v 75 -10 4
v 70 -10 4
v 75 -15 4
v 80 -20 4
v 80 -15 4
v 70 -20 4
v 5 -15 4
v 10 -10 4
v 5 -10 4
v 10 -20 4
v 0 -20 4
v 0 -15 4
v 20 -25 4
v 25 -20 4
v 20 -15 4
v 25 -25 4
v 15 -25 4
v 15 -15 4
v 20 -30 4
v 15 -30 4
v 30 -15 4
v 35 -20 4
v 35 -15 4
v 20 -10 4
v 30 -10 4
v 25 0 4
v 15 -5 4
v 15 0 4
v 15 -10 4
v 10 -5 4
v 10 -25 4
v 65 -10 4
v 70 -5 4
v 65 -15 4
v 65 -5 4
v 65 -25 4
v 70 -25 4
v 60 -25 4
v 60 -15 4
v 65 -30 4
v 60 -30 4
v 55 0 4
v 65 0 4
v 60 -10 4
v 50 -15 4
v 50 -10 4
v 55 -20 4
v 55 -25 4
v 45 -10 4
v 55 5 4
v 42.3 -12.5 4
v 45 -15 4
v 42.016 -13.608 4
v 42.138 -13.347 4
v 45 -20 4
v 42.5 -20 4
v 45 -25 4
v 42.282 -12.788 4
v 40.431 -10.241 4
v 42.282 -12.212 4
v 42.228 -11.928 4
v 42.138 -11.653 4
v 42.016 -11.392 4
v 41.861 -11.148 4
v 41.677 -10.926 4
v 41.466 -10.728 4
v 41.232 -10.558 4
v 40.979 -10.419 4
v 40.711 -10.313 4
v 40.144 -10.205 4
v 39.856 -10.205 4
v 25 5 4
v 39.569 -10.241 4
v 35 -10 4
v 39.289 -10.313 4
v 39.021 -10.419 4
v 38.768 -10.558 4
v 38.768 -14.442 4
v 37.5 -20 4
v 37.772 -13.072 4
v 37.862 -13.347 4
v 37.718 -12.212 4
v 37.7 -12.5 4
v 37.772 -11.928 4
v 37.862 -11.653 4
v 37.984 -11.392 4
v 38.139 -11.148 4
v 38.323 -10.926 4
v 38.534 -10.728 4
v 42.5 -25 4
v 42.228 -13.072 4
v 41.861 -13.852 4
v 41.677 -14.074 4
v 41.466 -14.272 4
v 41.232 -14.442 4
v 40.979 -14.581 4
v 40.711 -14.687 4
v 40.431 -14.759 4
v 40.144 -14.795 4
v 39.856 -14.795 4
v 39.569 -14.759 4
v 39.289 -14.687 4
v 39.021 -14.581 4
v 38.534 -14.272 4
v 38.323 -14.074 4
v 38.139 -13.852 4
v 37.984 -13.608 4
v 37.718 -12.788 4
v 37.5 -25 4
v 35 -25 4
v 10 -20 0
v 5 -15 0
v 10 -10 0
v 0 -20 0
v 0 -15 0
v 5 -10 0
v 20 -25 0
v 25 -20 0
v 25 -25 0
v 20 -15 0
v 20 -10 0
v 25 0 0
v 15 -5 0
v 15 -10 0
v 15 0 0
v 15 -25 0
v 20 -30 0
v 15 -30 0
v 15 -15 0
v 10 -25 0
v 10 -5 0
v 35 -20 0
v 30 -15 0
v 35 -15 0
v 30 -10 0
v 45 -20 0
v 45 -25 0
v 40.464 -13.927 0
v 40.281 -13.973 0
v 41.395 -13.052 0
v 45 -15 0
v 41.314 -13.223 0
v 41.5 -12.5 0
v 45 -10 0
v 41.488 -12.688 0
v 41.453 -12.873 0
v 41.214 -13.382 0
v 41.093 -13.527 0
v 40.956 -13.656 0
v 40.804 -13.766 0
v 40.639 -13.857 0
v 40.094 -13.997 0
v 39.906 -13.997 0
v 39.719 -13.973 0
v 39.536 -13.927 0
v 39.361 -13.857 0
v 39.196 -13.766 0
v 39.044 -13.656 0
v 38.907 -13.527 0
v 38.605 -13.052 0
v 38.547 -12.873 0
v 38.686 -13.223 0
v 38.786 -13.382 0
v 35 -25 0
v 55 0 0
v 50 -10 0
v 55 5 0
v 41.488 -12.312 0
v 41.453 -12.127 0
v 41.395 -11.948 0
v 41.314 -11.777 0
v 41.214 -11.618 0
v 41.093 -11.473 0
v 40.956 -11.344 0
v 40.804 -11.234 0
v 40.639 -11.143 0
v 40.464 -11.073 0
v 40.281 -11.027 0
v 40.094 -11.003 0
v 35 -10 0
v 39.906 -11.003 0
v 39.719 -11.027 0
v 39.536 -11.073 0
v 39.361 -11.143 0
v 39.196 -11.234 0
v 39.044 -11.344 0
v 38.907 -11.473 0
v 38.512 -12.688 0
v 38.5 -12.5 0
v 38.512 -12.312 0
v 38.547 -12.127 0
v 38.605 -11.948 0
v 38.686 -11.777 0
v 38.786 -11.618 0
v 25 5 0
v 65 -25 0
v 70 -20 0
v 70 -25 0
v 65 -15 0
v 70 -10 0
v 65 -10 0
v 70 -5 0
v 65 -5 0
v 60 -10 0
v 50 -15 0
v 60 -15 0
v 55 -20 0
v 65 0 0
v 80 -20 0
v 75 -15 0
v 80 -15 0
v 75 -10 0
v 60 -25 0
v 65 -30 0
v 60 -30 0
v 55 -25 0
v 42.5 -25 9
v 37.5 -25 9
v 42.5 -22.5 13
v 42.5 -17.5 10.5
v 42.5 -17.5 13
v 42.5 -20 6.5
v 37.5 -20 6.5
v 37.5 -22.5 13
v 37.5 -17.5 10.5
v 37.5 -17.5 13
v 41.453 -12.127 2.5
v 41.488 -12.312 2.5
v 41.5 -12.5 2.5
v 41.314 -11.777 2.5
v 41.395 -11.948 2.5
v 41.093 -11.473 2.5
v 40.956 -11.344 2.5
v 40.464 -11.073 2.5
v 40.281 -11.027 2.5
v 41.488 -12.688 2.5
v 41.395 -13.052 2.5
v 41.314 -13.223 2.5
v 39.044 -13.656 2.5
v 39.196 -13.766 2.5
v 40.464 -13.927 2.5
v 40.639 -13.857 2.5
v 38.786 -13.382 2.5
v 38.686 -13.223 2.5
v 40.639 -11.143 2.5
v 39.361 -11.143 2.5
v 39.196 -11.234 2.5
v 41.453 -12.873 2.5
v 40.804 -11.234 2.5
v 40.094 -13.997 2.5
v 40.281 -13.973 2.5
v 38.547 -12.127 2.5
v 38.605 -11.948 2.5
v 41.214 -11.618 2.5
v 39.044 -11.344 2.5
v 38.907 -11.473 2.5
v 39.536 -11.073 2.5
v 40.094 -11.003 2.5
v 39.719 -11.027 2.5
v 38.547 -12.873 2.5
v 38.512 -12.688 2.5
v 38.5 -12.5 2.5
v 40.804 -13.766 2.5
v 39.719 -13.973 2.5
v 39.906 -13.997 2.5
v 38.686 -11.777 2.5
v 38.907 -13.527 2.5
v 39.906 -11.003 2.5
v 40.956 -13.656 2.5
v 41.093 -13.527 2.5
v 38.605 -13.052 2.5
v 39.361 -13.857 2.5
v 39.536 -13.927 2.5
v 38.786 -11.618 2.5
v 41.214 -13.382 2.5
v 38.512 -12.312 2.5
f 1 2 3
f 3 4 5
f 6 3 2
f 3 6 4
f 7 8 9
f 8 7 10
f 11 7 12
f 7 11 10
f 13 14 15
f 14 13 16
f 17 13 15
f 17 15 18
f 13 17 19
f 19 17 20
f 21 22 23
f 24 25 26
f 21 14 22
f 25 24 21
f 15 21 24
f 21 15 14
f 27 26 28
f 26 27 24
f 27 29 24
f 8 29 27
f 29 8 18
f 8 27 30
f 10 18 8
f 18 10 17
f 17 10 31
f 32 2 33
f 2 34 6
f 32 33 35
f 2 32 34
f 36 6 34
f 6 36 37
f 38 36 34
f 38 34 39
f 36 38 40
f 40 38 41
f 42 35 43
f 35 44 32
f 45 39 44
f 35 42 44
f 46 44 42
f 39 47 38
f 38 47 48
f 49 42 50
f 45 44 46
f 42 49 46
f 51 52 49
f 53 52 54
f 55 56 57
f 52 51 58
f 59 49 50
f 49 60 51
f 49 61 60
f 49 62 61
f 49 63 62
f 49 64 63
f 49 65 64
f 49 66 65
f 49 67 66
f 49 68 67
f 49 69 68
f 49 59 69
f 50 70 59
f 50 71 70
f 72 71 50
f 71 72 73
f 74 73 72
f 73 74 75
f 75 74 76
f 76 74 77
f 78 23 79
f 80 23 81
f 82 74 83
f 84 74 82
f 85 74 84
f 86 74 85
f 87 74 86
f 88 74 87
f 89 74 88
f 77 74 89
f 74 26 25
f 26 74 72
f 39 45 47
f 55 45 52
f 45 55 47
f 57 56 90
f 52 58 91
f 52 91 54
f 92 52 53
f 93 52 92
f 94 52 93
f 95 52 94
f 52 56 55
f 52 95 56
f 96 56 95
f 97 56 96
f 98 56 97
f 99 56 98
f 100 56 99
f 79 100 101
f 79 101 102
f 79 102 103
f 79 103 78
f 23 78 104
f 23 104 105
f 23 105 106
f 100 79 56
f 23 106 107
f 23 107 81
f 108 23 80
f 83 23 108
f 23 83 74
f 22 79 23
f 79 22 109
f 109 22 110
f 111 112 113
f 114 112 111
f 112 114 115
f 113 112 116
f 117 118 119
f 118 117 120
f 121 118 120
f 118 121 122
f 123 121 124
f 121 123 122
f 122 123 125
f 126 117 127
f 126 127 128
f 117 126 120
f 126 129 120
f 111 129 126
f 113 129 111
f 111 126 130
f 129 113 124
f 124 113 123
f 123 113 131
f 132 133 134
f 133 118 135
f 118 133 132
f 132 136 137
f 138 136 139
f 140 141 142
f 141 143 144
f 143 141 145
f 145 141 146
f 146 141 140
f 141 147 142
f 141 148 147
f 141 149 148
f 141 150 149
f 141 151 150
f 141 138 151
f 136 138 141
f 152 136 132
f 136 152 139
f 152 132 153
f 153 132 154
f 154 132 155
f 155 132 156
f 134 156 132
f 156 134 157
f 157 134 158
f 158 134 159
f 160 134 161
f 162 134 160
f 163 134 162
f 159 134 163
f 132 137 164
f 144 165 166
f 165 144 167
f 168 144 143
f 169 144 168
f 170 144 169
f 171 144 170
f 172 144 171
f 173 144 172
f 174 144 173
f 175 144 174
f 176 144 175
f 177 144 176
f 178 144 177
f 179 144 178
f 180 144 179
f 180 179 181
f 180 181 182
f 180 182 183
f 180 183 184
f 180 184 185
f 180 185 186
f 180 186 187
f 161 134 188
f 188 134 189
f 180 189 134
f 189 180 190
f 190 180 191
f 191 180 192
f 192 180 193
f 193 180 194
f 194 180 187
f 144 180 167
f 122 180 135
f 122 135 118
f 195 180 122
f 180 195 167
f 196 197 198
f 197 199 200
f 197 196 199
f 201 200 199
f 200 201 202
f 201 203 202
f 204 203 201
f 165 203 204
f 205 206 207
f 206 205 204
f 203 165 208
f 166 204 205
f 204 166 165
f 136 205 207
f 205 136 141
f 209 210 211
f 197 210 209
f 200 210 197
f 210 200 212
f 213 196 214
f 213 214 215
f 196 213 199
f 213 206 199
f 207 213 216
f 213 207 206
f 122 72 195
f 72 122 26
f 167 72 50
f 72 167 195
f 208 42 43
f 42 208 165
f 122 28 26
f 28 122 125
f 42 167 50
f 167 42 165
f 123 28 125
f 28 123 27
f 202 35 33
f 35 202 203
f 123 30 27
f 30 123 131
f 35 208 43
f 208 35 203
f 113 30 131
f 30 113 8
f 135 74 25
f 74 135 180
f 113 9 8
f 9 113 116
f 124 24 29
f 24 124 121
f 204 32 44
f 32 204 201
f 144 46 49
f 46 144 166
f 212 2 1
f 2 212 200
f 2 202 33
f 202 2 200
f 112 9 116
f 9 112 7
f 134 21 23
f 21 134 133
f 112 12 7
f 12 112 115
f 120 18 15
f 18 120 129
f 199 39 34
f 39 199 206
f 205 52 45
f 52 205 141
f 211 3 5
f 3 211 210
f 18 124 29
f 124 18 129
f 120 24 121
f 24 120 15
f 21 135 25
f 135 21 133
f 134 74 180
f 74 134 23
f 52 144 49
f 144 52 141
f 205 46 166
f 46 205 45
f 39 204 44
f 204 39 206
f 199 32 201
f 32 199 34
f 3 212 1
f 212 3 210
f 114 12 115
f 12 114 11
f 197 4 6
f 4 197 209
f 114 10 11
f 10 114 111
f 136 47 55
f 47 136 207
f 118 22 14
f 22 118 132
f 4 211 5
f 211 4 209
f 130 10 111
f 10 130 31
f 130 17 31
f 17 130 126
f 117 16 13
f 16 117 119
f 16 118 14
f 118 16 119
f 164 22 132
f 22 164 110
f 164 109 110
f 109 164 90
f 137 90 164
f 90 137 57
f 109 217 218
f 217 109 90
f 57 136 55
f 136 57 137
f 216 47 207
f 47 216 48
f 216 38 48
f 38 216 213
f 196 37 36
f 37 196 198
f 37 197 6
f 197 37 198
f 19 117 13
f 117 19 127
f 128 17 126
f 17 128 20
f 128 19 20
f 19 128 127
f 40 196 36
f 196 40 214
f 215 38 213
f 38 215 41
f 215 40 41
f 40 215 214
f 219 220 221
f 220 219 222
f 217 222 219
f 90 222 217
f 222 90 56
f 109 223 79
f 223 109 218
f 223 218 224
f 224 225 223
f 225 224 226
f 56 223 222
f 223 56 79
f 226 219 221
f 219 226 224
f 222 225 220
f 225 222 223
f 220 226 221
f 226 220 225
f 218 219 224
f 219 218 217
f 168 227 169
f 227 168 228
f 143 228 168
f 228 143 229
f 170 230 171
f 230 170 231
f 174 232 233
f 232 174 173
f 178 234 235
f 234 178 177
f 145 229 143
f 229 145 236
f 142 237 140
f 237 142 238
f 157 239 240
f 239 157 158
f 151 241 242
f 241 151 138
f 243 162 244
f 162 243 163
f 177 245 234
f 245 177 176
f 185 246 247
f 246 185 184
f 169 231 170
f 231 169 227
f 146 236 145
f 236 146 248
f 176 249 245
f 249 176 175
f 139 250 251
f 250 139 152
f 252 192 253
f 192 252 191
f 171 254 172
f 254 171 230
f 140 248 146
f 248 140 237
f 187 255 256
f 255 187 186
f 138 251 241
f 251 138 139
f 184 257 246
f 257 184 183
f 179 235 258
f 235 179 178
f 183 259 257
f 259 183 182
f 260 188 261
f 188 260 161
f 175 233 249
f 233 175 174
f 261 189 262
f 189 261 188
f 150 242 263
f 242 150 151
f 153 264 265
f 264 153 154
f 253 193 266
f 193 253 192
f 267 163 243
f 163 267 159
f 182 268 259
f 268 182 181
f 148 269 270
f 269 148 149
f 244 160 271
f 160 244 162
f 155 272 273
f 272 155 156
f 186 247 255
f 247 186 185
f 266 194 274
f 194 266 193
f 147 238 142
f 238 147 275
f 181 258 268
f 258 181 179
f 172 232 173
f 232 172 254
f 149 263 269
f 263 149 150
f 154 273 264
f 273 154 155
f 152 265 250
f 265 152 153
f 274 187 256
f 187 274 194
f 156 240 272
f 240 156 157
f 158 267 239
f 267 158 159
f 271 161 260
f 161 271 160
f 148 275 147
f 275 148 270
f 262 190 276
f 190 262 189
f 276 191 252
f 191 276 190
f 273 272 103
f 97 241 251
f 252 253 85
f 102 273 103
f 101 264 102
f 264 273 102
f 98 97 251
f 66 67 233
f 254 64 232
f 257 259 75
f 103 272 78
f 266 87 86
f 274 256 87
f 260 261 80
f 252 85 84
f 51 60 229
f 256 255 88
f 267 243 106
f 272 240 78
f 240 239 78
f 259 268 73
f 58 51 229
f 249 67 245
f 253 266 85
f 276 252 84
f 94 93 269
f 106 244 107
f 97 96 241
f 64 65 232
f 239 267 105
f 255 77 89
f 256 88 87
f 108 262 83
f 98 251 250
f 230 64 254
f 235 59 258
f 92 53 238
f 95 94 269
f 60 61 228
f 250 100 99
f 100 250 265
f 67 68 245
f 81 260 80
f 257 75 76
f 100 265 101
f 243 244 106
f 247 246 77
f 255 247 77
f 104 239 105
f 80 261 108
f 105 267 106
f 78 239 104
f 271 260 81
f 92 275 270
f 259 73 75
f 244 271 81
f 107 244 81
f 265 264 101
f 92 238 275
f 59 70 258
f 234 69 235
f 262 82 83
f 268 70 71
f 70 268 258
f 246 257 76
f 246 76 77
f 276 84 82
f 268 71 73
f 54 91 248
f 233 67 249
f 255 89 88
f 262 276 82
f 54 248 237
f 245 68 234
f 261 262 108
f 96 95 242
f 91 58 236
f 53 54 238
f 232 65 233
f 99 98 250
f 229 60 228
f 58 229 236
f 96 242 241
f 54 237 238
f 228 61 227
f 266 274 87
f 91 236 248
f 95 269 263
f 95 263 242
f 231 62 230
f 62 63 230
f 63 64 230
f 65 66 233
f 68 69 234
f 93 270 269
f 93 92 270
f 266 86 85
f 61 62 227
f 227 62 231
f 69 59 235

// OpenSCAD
/* ********************************************************************
 * Space Invader Hooks
 * 
 * Generate your own cloth hooks. Tweak parameters, create your own
 * hooks or use the predefined modules.
 *
 * ******************************************************************** */

// preview[view:south, tilt:top]

// ------------------------------------------------------------------
// --- parameter ----------------------------------------------------
// ------------------------------------------------------------------

/* [Global] */

// choose a space invader
spaceInvader = 10; // [1,2,3,4,5,6,7,8,9,10]

// pixel size
edgeLength = 5;

// thickness of the hook
strength = 4;

// radius of the hole
holeRadius = 1.5;

// adjust the strength of the connections of otherwise unconnected pixel
pixel_connection_strength = 0.4;


/* [Advanced] */

// resolution
$fn=50;

// make a hole or not
make_hole = "yes"; // [yes,no]

// make a hook or just the base space invader
make_hook = "yes"; // [yes,no]

// use to avoid loonely pixel
minkowski_factor=10;



/* [Hidden] */

// ------------------------------------------------------------------
// --- space invader versions ---------------------------------------
// --- a vector of 2d coordinates; hole and hook position -----------
// ------------------------------------------------------------------

// space invader 1 parameter
si_1=[[0,0,1,0,1,0,0],[0,1,1,1,1,1,0],[0,1,0,1,0,1,0],[1,1,1,1,1,1,1],[1,0,1,0,1,0,1],[1,0,0,0,0,0,1]];
si_1_hole=[3,2];
si_1_hook=[3,4];

// space invader 2 parameter
si_2=[[0,0,1,0,1,0,0],[0,1,1,1,1,1,0],[0,1,0,1,0,1,0],[1,1,1,1,1,1,1],[1,0,1,1,1,0,1],[1,0,0,1,0,0,1]];
si_2_hole=[3,3];
si_2_hook=[3,5];

// space invader 3 parameter
si_3=[[0,0,1,0,1,0,0],[0,1,1,1,1,1,0],[0,1,0,1,0,1,0],[1,1,1,1,1,1,1],[1,0,1,1,1,0,1],[1,0,0,1,0,0,1],[0,0,0,1,0,0,0]];
si_3_hole=[3,3];
si_3_hook=[3,6];

// space invader 5 parameter
si_4=[[0,0,1,0,1,0,0],[0,1,1,1,1,1,0],[0,1,0,1,0,1,0],[1,1,1,1,1,1,1],[1,0,1,1,1,0,1],[1,0,0,1,0,0,1],[1,1,0,1,0,1,1]];
si_4_hole=[3,3];
si_4_hook=[3,6];

// space invader 5 parameter
si_5=[[0,0,1,1,0,1,1,0,0],[0,1,1,1,1,1,1,1,0],[0,1,0,0,1,0,0,1,0],[1,1,0,0,1,0,0,1,1],[1,1,1,1,1,1,1,1,1],[0,0,1,1,1,1,1,0,0],[0,1,1,0,1,0,1,1,0],[1,1,0,0,0,0,0,1,1]];
si_5_hole=[4,4];
si_5_hook=[4,6];

// space invader 6 parameter
si_6=[[0,0,1,0,0,0,0,0,1,0,0],[0,0,0,1,0,0,0,1,0,0,0],[0,0,1,1,1,1,1,1,1,0,0],[0,1,1,0,1,1,1,0,1,1,0],[1,1,1,1,1,1,1,1,1,1,1],[1,0,1,1,1,1,1,1,1,0,1],[1,0,1,0,0,0,0,0,1,0,1],[0,0,0,1,1,0,1,1,0,0,0]];
si_6_hole=[5,3];
si_6_hook=[5,5];
si_6_cons=[[0,0,2,0,0,0,0,0,0,0,0],[0,0,0,0,0,0,0,1,0,0,0],[0,0,0,0,0,0,0,0,0,0,0],[0,0,0,0,0,0,0,0,0,0,0],[0,0,0,0,0,0,0,0,0,0,0],[0,0,0,0,0,0,0,0,0,0,0],[0,0,2,0,0,0,0,0,0,0,0],[0,0,0,0,0,0,0,1,0,0,0]];

// space invader 7 parameter
si_7=[[0,0,0,1,1,0,0,0],[0,0,1,1,1,1,0,0],[0,1,1,1,1,1,1,0],[1,1,0,1,1,0,1,1],[1,1,1,1,1,1,1,1],[0,1,0,1,1,0,1,0],[1,0,0,0,0,0,0,1],[0,1,0,0,0,0,1,0]];
si_7_hole=[3.5,3];
si_7_hook=[3.5,5];
si_7_cons=[[0,0,0,0,0,0,0,0],[0,0,0,0,0,0,0,0],[0,0,0,0,0,0,0,0],[0,0,0,0,0,0,0,0],[0,0,0,0,0,0,0,0],[0,0,0,0,0,0,2,0],[3,0,0,0,0,0,0,0],[0,0,0,0,0,0,1,0]];

// space invader 8 parameter
si_8=[[0,0,0,1,1,0,0,0],[0,0,1,1,1,1,0,0],[0,1,1,1,1,1,1,0],[1,1,0,1,1,0,1,1],[1,1,1,1,1,1,1,1],[0,1,0,1,1,0,1,0],[1,0,1,0,0,1,0,1],[0,1,0,1,1,0,1,0]];
si_8_hole=[3.5,3];
si_8_hook=[3.5,5];
si_8_cons=[[0,0,0,0,0,0,0,0],[0,0,0,0,0,0,0,0],[0,0,0,0,0,0,0,0],[0,0,0,0,0,0,0,0],[0,0,0,0,0,0,0,0],[0,2,0,0,2,0,2,0],[3,0,3,0,0,3,0,0],[0,1,0,0,1,0,1,0]];

// space invader 9 parameter
si_9=[[0,0,0,0,1,1,1,1,0,0,0,0],[0,1,1,1,1,1,1,1,1,1,1,0],[1,1,1,1,1,1,1,1,1,1,1,1],[1,1,1,0,0,1,1,0,0,1,1,1],[1,1,1,1,1,1,1,1,1,1,1,1],[0,0,1,1,1,0,0,1,1,1,0,0],[0,1,1,0,0,1,1,0,0,1,1,0],[0,0,1,1,0,0,0,0,1,1,0,0]];
si_9_hole=[5.5,2];
si_9_hook=[5.5,4];
si_9_cons=[[0,0,0,0,0,0,0,0,0,0,0,0],[0,0,0,0,0,0,0,0,0,0,0,0],[0,0,0,0,0,0,0,0,0,0,0,0],[0,0,0,0,0,0,0,0,0,0,0,0],[0,0,0,0,0,0,0,0,0,0,0,0],[0,0,0,0,2,0,0,0,0,0,0,0],[0,0,0,0,0,0,1,0,0,0,0,0],[0,0,0,0,0,0,0,0,0,0,0,0]];

si_10=[[0,0,0,0,0,1,1,1,1,1,1,0,0,0,0,0],[0,0,0,1,1,1,1,1,1,1,1,1,1,0,0,0],[0,0,1,1,1,1,1,1,1,1,1,1,1,1,0,0],[0,1,1,0,1,1,0,1,1,0,1,1,0,1,1,0],[1,1,1,1,1,1,1,1,1,1,1,1,1,1,1,1],[0,0,1,1,1,0,0,1,1,0,0,1,1,1,0,0],[0,0,0,1,0,0,0,0,0,0,0,0,1,0,0,0]];
si_10_hole=[7.5,3];
si_10_hook=[7.5,5];
si_10_cons=[];




// ------------------------------------------------------------------
// --- programm -----------------------------------------------------
// ------------------------------------------------------------------

if (spaceInvader == 1) {
	complete_hook(si_1, [], si_1_hole, si_1_hook);
} else if (spaceInvader == 2) {
	complete_hook(si_2, [], si_2_hole, si_2_hook);
} else if (spaceInvader == 3) {
	complete_hook(si_3, [], si_3_hole, si_3_hook);
} else if (spaceInvader == 4) {
	complete_hook(si_4, [], si_4_hole, si_4_hook);
} else if (spaceInvader == 5) {
	complete_hook(si_5, [], si_5_hole, si_5_hook);
} else if (spaceInvader == 6) {
	complete_hook(si_6, si_6_cons, si_6_hole, si_6_hook);
} else if (spaceInvader == 7) {
	complete_hook(si_7, si_7_cons, si_7_hole, si_7_hook);
} else if (spaceInvader == 8) {
	complete_hook(si_8, si_8_cons, si_8_hole, si_8_hook);
} else if (spaceInvader == 9) {
	complete_hook(si_9, si_9_cons, si_9_hole, si_9_hook);
} else if (spaceInvader == 10) {
	complete_hook(si_10, si_10_cons, si_10_hole, si_10_hook);
}




// ------------------------------------------------------------------
// --- modules ------------------------------------------------------
// ------------------------------------------------------------------



module complete_hook(matrix, cons, hole, hook) {
	difference() {
		union() {
			hook_base(matrix);
			connections(cons);
			if (make_hook == "yes") {
				hook(hook[0], hook[1]);
			}
		}
		if (make_hole == "yes") {
			hook_hole_positive(hole[0], hole[1], 1);
		}
	}
}


module hook_base(data) {
	for (y = [0:len(data)]) {
		for(x = [0:len(data[y])]) {
			pixel(x,y,data[y][x]);
		}
	}
}

module connections(data) {
	for (y = [0:len(data)]) {
		for(x = [0:len(data[y])]) {
			if (data[y][x] > 0) {
				pixel_connection(x,y,data[y][x]);
			}
		}
	}
}

// builds a cube at specified position
//
module pixel(x, y, h) {
	translate([x*edgeLength, -y*edgeLength, 0]) {
		if (h > 0) {
			cube([edgeLength, edgeLength, strength*h]);
			/*
			minkowski()
			{
				cube([edgeLength, edgeLength, strength*h-(strength/5)]);
 				cylinder(r=strength/10,h=strength*h-(strength/5));
			}
			*/
		}
	}
}

// build a connection
module pixel_connection(x,y,direction) {
	translate([(x+0.5)*edgeLength,-(y-0.5)*edgeLength,0]) {
		if (direction == 3) {
			union() {
				hull() {
					cylinder(r=pixel_connection_strength, h=strength);
					translate([edgeLength,edgeLength,0]) {
						cylinder(r=pixel_connection_strength, h=strength);
					}
				}
				hull() {
					cylinder(r=pixel_connection_strength, h=strength);
					translate([edgeLength,-edgeLength,0]) {
						cylinder(r=pixel_connection_strength, h=strength);
					}
				}
			}
		}
		hull() {
			cylinder(r=pixel_connection_strength, h=strength);
			if (direction == 1) {
				translate([edgeLength,edgeLength,0]) {
					cylinder(r=pixel_connection_strength, h=strength);
				}
			}
			if (direction == 2) {
				translate([edgeLength,-edgeLength,0]) {
					cylinder(r=pixel_connection_strength, h=strength);
				}
			}
		}
	}
}

// make the positives for the holes
//
module hook_hole_positive(x,y,h) {
	translate([x*edgeLength+edgeLength/2, -y*edgeLength+edgeLength/2, 0]) {
		cylinder(h=strength*h, r=1.5);
		hull() {
			translate([0, 0, strength*h-holeRadius]) cylinder(h=0.1, r=holeRadius);
			translate([0, 0, strength*h]) cylinder(h=0.1, r=2.3);
		}
	}
}

// builds the hook at specified position
//
module hook(x, y) {
	translate([x*edgeLength, -y*edgeLength, 0]) {
		union() {
			cube([edgeLength, edgeLength, 0.5*edgeLength+strength]);
			hull() {
				translate([0, 0, 0.5*edgeLength+strength]) {
					cube([edgeLength, edgeLength, 0.5*edgeLength]);
				}
				translate([0, 0.5*edgeLength, 0.5*edgeLength+2*strength]) {
					cube([edgeLength, edgeLength, 0.5*edgeLength]);
				}
			}
		}
	}
}
